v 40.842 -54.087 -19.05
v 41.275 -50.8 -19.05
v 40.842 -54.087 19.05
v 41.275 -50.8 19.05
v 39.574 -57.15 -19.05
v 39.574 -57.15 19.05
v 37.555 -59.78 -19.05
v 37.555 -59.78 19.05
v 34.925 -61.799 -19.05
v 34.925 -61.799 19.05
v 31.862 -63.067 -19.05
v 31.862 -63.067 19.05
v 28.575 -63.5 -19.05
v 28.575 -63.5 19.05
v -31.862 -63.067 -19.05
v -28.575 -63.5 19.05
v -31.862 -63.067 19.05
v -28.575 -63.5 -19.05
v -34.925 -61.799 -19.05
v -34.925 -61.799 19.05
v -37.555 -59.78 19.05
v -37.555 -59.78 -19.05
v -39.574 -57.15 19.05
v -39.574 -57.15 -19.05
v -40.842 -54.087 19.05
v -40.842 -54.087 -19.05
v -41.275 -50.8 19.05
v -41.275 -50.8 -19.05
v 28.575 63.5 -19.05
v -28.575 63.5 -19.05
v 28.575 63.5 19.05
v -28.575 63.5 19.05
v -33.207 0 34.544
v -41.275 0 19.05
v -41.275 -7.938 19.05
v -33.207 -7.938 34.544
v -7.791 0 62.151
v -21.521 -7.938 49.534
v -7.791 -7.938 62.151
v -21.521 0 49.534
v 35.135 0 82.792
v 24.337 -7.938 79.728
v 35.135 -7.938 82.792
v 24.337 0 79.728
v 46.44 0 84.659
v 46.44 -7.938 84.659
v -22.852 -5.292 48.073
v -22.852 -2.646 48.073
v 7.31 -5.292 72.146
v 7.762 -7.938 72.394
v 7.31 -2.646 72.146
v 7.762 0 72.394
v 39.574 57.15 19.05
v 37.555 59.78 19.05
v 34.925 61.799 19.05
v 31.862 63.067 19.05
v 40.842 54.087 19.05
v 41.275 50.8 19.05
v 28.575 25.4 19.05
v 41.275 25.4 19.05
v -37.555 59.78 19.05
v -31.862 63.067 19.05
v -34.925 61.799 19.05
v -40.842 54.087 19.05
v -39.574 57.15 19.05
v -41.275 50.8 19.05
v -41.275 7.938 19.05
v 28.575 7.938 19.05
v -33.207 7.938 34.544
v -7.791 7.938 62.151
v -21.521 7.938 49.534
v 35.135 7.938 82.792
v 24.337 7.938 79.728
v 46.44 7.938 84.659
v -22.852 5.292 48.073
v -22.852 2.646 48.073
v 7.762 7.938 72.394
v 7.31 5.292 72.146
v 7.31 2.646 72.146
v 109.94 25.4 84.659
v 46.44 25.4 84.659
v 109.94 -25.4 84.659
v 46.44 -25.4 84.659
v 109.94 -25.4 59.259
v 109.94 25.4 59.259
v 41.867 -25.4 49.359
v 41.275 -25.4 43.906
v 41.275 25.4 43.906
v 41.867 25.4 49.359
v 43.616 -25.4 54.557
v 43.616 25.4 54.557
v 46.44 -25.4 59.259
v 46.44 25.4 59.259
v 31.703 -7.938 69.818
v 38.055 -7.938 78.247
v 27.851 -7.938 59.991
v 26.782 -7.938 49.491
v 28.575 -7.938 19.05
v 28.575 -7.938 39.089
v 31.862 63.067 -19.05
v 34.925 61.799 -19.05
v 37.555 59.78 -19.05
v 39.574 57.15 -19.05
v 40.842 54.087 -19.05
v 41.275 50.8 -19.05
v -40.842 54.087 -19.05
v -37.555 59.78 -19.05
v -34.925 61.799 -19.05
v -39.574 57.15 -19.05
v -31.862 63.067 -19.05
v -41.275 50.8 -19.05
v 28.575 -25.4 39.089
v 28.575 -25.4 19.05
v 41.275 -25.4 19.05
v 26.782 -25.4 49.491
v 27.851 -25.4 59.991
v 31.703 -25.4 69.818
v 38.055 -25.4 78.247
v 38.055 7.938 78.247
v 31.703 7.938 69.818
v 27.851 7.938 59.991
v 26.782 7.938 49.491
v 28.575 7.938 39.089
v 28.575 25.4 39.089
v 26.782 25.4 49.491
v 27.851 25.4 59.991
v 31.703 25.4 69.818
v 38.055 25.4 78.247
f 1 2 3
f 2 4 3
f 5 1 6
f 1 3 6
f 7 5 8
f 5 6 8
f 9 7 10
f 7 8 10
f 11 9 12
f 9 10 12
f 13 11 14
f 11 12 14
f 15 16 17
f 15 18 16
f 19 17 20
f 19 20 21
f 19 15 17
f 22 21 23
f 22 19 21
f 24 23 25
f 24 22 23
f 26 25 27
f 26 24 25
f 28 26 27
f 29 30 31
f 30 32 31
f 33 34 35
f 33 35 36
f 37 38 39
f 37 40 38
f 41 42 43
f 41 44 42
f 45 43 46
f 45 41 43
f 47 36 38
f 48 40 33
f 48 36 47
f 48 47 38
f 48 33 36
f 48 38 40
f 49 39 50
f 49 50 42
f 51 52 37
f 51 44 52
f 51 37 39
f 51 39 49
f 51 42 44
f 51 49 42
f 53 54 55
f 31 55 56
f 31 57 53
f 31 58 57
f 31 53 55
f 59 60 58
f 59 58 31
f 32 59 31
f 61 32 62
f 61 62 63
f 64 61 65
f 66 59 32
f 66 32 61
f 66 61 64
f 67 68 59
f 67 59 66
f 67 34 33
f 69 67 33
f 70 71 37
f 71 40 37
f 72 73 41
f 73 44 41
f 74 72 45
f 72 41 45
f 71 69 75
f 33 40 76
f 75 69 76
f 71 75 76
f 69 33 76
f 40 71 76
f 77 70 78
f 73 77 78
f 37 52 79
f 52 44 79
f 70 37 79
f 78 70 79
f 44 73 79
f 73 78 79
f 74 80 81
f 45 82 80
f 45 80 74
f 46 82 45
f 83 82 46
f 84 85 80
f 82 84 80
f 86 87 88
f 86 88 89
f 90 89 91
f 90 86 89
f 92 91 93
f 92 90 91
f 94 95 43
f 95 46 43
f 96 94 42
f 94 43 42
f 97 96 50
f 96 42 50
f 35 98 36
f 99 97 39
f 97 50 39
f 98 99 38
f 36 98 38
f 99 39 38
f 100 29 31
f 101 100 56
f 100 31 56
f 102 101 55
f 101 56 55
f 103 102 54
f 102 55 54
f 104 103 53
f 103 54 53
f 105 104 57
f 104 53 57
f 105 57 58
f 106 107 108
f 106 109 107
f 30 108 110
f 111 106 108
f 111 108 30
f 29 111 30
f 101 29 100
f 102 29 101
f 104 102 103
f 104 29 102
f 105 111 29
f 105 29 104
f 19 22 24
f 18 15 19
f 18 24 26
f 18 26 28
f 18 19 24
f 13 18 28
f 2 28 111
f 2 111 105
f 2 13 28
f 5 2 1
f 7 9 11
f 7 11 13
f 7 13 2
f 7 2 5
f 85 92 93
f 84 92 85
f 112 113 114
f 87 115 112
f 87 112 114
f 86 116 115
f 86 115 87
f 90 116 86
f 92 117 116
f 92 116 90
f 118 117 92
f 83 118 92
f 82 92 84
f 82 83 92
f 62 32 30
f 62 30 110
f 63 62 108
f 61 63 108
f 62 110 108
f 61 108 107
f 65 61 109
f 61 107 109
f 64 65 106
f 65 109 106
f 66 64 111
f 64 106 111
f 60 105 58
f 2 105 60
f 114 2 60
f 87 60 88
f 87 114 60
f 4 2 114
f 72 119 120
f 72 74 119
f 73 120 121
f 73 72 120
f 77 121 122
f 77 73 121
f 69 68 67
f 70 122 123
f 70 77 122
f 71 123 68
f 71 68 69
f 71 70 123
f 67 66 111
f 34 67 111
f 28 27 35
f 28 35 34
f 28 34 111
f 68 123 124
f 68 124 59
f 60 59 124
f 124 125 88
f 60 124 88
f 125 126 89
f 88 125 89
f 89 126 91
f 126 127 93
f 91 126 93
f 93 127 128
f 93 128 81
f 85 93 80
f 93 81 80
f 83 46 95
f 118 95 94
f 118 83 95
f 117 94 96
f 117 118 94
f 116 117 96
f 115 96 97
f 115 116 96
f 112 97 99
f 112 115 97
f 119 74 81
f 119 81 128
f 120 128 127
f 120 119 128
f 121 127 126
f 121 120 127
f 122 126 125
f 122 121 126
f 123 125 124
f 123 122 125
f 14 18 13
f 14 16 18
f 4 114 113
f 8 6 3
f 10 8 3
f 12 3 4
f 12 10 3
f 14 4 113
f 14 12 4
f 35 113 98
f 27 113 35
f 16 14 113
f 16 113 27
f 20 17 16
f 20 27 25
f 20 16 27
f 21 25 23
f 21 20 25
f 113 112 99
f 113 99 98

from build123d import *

# Parameters (mm, degrees)
F1_DEPTH = 63.5
F2_DEPTH = 25.4
F3_DEPTH = 7.9375
F4_R     = 12.7


with BuildPart() as f1:
    # F0 (on Front) → F1 (new body, symmetric)
    with BuildSketch(Plane.XZ):
        Polygon((-41.275, -19.05), (41.275, -19.05), (41.275, 19.05), (28.575, 19.05), (-41.275, 19.05), align=None)
    extrude(amount=F1_DEPTH, both=True)

    # F0 (on Front) → F2 (join, symmetric)
    with BuildSketch(Plane.XZ):
        with BuildLine():
            Line((28.575, 19.05), (41.275, 19.05))
            Line((41.275, 19.05), (41.275, 43.906411))
            ThreePointArc((41.275, 43.906411), (42.600833, 52.005452), (46.439918, 59.258983))
            Line((46.439918, 59.258983), (46.439918, 84.658983))
            ThreePointArc((46.439918, 84.658983), (29.442195, 65.035984), (28.575, 39.089256))
            Line((28.575, 39.089256), (28.575, 19.05))
        make_face()
        with BuildLine():
            Line((109.939918, 84.658983), (46.439918, 84.658983))
            Line((46.439918, 84.658983), (61.292269, 68.729509))
            ThreePointArc((61.292269, 68.729509), (53.018836, 65.322975), (46.439918, 59.258983))
            Line((46.439918, 59.258983), (109.939918, 59.258983))
            Line((109.939918, 59.258983), (109.939918, 84.658983))
        make_face()
        with BuildLine():
            Line((61.292269, 68.729509), (46.439918, 84.658983))
            Line((46.439918, 84.658983), (46.439918, 59.258983))
            ThreePointArc((46.439918, 59.258983), (53.018836, 65.322975), (61.292269, 68.729509))
        make_face()
    extrude(amount=F2_DEPTH, both=True)

    # F0 (on Front) → F3 (join, symmetric)
    with BuildSketch(Plane.XZ):
        with BuildLine():
            add(Edge.make_bspline(
                [(-41.275, 19.05), (-29.644612, 48.343893), (3.748323, 80.129104), (46.439918, 84.658983)],
                knots=[0, 0, 0, 0, 109.537416, 109.537416, 109.537416, 109.537416], degree=3))
            Line((-41.275, 19.05), (28.575, 19.05))
            Line((28.575, 19.05), (28.575, 39.089256))
            ThreePointArc((28.575, 39.089256), (29.442195, 65.035984), (46.439918, 84.658983))
        make_face()
    extrude(amount=F3_DEPTH, both=True)

    # F4
    f4_edges = [f1.edges().sort_by_distance(p)[0] for p in [
        (-41.275, -63.5, 0),
        (-41.275, 63.5, 0),
        (41.275, 63.5, 0),
        (41.275, -63.5, 0),
    ]]
    fillet(f4_edges, radius=F4_R)


solid = f1.part
